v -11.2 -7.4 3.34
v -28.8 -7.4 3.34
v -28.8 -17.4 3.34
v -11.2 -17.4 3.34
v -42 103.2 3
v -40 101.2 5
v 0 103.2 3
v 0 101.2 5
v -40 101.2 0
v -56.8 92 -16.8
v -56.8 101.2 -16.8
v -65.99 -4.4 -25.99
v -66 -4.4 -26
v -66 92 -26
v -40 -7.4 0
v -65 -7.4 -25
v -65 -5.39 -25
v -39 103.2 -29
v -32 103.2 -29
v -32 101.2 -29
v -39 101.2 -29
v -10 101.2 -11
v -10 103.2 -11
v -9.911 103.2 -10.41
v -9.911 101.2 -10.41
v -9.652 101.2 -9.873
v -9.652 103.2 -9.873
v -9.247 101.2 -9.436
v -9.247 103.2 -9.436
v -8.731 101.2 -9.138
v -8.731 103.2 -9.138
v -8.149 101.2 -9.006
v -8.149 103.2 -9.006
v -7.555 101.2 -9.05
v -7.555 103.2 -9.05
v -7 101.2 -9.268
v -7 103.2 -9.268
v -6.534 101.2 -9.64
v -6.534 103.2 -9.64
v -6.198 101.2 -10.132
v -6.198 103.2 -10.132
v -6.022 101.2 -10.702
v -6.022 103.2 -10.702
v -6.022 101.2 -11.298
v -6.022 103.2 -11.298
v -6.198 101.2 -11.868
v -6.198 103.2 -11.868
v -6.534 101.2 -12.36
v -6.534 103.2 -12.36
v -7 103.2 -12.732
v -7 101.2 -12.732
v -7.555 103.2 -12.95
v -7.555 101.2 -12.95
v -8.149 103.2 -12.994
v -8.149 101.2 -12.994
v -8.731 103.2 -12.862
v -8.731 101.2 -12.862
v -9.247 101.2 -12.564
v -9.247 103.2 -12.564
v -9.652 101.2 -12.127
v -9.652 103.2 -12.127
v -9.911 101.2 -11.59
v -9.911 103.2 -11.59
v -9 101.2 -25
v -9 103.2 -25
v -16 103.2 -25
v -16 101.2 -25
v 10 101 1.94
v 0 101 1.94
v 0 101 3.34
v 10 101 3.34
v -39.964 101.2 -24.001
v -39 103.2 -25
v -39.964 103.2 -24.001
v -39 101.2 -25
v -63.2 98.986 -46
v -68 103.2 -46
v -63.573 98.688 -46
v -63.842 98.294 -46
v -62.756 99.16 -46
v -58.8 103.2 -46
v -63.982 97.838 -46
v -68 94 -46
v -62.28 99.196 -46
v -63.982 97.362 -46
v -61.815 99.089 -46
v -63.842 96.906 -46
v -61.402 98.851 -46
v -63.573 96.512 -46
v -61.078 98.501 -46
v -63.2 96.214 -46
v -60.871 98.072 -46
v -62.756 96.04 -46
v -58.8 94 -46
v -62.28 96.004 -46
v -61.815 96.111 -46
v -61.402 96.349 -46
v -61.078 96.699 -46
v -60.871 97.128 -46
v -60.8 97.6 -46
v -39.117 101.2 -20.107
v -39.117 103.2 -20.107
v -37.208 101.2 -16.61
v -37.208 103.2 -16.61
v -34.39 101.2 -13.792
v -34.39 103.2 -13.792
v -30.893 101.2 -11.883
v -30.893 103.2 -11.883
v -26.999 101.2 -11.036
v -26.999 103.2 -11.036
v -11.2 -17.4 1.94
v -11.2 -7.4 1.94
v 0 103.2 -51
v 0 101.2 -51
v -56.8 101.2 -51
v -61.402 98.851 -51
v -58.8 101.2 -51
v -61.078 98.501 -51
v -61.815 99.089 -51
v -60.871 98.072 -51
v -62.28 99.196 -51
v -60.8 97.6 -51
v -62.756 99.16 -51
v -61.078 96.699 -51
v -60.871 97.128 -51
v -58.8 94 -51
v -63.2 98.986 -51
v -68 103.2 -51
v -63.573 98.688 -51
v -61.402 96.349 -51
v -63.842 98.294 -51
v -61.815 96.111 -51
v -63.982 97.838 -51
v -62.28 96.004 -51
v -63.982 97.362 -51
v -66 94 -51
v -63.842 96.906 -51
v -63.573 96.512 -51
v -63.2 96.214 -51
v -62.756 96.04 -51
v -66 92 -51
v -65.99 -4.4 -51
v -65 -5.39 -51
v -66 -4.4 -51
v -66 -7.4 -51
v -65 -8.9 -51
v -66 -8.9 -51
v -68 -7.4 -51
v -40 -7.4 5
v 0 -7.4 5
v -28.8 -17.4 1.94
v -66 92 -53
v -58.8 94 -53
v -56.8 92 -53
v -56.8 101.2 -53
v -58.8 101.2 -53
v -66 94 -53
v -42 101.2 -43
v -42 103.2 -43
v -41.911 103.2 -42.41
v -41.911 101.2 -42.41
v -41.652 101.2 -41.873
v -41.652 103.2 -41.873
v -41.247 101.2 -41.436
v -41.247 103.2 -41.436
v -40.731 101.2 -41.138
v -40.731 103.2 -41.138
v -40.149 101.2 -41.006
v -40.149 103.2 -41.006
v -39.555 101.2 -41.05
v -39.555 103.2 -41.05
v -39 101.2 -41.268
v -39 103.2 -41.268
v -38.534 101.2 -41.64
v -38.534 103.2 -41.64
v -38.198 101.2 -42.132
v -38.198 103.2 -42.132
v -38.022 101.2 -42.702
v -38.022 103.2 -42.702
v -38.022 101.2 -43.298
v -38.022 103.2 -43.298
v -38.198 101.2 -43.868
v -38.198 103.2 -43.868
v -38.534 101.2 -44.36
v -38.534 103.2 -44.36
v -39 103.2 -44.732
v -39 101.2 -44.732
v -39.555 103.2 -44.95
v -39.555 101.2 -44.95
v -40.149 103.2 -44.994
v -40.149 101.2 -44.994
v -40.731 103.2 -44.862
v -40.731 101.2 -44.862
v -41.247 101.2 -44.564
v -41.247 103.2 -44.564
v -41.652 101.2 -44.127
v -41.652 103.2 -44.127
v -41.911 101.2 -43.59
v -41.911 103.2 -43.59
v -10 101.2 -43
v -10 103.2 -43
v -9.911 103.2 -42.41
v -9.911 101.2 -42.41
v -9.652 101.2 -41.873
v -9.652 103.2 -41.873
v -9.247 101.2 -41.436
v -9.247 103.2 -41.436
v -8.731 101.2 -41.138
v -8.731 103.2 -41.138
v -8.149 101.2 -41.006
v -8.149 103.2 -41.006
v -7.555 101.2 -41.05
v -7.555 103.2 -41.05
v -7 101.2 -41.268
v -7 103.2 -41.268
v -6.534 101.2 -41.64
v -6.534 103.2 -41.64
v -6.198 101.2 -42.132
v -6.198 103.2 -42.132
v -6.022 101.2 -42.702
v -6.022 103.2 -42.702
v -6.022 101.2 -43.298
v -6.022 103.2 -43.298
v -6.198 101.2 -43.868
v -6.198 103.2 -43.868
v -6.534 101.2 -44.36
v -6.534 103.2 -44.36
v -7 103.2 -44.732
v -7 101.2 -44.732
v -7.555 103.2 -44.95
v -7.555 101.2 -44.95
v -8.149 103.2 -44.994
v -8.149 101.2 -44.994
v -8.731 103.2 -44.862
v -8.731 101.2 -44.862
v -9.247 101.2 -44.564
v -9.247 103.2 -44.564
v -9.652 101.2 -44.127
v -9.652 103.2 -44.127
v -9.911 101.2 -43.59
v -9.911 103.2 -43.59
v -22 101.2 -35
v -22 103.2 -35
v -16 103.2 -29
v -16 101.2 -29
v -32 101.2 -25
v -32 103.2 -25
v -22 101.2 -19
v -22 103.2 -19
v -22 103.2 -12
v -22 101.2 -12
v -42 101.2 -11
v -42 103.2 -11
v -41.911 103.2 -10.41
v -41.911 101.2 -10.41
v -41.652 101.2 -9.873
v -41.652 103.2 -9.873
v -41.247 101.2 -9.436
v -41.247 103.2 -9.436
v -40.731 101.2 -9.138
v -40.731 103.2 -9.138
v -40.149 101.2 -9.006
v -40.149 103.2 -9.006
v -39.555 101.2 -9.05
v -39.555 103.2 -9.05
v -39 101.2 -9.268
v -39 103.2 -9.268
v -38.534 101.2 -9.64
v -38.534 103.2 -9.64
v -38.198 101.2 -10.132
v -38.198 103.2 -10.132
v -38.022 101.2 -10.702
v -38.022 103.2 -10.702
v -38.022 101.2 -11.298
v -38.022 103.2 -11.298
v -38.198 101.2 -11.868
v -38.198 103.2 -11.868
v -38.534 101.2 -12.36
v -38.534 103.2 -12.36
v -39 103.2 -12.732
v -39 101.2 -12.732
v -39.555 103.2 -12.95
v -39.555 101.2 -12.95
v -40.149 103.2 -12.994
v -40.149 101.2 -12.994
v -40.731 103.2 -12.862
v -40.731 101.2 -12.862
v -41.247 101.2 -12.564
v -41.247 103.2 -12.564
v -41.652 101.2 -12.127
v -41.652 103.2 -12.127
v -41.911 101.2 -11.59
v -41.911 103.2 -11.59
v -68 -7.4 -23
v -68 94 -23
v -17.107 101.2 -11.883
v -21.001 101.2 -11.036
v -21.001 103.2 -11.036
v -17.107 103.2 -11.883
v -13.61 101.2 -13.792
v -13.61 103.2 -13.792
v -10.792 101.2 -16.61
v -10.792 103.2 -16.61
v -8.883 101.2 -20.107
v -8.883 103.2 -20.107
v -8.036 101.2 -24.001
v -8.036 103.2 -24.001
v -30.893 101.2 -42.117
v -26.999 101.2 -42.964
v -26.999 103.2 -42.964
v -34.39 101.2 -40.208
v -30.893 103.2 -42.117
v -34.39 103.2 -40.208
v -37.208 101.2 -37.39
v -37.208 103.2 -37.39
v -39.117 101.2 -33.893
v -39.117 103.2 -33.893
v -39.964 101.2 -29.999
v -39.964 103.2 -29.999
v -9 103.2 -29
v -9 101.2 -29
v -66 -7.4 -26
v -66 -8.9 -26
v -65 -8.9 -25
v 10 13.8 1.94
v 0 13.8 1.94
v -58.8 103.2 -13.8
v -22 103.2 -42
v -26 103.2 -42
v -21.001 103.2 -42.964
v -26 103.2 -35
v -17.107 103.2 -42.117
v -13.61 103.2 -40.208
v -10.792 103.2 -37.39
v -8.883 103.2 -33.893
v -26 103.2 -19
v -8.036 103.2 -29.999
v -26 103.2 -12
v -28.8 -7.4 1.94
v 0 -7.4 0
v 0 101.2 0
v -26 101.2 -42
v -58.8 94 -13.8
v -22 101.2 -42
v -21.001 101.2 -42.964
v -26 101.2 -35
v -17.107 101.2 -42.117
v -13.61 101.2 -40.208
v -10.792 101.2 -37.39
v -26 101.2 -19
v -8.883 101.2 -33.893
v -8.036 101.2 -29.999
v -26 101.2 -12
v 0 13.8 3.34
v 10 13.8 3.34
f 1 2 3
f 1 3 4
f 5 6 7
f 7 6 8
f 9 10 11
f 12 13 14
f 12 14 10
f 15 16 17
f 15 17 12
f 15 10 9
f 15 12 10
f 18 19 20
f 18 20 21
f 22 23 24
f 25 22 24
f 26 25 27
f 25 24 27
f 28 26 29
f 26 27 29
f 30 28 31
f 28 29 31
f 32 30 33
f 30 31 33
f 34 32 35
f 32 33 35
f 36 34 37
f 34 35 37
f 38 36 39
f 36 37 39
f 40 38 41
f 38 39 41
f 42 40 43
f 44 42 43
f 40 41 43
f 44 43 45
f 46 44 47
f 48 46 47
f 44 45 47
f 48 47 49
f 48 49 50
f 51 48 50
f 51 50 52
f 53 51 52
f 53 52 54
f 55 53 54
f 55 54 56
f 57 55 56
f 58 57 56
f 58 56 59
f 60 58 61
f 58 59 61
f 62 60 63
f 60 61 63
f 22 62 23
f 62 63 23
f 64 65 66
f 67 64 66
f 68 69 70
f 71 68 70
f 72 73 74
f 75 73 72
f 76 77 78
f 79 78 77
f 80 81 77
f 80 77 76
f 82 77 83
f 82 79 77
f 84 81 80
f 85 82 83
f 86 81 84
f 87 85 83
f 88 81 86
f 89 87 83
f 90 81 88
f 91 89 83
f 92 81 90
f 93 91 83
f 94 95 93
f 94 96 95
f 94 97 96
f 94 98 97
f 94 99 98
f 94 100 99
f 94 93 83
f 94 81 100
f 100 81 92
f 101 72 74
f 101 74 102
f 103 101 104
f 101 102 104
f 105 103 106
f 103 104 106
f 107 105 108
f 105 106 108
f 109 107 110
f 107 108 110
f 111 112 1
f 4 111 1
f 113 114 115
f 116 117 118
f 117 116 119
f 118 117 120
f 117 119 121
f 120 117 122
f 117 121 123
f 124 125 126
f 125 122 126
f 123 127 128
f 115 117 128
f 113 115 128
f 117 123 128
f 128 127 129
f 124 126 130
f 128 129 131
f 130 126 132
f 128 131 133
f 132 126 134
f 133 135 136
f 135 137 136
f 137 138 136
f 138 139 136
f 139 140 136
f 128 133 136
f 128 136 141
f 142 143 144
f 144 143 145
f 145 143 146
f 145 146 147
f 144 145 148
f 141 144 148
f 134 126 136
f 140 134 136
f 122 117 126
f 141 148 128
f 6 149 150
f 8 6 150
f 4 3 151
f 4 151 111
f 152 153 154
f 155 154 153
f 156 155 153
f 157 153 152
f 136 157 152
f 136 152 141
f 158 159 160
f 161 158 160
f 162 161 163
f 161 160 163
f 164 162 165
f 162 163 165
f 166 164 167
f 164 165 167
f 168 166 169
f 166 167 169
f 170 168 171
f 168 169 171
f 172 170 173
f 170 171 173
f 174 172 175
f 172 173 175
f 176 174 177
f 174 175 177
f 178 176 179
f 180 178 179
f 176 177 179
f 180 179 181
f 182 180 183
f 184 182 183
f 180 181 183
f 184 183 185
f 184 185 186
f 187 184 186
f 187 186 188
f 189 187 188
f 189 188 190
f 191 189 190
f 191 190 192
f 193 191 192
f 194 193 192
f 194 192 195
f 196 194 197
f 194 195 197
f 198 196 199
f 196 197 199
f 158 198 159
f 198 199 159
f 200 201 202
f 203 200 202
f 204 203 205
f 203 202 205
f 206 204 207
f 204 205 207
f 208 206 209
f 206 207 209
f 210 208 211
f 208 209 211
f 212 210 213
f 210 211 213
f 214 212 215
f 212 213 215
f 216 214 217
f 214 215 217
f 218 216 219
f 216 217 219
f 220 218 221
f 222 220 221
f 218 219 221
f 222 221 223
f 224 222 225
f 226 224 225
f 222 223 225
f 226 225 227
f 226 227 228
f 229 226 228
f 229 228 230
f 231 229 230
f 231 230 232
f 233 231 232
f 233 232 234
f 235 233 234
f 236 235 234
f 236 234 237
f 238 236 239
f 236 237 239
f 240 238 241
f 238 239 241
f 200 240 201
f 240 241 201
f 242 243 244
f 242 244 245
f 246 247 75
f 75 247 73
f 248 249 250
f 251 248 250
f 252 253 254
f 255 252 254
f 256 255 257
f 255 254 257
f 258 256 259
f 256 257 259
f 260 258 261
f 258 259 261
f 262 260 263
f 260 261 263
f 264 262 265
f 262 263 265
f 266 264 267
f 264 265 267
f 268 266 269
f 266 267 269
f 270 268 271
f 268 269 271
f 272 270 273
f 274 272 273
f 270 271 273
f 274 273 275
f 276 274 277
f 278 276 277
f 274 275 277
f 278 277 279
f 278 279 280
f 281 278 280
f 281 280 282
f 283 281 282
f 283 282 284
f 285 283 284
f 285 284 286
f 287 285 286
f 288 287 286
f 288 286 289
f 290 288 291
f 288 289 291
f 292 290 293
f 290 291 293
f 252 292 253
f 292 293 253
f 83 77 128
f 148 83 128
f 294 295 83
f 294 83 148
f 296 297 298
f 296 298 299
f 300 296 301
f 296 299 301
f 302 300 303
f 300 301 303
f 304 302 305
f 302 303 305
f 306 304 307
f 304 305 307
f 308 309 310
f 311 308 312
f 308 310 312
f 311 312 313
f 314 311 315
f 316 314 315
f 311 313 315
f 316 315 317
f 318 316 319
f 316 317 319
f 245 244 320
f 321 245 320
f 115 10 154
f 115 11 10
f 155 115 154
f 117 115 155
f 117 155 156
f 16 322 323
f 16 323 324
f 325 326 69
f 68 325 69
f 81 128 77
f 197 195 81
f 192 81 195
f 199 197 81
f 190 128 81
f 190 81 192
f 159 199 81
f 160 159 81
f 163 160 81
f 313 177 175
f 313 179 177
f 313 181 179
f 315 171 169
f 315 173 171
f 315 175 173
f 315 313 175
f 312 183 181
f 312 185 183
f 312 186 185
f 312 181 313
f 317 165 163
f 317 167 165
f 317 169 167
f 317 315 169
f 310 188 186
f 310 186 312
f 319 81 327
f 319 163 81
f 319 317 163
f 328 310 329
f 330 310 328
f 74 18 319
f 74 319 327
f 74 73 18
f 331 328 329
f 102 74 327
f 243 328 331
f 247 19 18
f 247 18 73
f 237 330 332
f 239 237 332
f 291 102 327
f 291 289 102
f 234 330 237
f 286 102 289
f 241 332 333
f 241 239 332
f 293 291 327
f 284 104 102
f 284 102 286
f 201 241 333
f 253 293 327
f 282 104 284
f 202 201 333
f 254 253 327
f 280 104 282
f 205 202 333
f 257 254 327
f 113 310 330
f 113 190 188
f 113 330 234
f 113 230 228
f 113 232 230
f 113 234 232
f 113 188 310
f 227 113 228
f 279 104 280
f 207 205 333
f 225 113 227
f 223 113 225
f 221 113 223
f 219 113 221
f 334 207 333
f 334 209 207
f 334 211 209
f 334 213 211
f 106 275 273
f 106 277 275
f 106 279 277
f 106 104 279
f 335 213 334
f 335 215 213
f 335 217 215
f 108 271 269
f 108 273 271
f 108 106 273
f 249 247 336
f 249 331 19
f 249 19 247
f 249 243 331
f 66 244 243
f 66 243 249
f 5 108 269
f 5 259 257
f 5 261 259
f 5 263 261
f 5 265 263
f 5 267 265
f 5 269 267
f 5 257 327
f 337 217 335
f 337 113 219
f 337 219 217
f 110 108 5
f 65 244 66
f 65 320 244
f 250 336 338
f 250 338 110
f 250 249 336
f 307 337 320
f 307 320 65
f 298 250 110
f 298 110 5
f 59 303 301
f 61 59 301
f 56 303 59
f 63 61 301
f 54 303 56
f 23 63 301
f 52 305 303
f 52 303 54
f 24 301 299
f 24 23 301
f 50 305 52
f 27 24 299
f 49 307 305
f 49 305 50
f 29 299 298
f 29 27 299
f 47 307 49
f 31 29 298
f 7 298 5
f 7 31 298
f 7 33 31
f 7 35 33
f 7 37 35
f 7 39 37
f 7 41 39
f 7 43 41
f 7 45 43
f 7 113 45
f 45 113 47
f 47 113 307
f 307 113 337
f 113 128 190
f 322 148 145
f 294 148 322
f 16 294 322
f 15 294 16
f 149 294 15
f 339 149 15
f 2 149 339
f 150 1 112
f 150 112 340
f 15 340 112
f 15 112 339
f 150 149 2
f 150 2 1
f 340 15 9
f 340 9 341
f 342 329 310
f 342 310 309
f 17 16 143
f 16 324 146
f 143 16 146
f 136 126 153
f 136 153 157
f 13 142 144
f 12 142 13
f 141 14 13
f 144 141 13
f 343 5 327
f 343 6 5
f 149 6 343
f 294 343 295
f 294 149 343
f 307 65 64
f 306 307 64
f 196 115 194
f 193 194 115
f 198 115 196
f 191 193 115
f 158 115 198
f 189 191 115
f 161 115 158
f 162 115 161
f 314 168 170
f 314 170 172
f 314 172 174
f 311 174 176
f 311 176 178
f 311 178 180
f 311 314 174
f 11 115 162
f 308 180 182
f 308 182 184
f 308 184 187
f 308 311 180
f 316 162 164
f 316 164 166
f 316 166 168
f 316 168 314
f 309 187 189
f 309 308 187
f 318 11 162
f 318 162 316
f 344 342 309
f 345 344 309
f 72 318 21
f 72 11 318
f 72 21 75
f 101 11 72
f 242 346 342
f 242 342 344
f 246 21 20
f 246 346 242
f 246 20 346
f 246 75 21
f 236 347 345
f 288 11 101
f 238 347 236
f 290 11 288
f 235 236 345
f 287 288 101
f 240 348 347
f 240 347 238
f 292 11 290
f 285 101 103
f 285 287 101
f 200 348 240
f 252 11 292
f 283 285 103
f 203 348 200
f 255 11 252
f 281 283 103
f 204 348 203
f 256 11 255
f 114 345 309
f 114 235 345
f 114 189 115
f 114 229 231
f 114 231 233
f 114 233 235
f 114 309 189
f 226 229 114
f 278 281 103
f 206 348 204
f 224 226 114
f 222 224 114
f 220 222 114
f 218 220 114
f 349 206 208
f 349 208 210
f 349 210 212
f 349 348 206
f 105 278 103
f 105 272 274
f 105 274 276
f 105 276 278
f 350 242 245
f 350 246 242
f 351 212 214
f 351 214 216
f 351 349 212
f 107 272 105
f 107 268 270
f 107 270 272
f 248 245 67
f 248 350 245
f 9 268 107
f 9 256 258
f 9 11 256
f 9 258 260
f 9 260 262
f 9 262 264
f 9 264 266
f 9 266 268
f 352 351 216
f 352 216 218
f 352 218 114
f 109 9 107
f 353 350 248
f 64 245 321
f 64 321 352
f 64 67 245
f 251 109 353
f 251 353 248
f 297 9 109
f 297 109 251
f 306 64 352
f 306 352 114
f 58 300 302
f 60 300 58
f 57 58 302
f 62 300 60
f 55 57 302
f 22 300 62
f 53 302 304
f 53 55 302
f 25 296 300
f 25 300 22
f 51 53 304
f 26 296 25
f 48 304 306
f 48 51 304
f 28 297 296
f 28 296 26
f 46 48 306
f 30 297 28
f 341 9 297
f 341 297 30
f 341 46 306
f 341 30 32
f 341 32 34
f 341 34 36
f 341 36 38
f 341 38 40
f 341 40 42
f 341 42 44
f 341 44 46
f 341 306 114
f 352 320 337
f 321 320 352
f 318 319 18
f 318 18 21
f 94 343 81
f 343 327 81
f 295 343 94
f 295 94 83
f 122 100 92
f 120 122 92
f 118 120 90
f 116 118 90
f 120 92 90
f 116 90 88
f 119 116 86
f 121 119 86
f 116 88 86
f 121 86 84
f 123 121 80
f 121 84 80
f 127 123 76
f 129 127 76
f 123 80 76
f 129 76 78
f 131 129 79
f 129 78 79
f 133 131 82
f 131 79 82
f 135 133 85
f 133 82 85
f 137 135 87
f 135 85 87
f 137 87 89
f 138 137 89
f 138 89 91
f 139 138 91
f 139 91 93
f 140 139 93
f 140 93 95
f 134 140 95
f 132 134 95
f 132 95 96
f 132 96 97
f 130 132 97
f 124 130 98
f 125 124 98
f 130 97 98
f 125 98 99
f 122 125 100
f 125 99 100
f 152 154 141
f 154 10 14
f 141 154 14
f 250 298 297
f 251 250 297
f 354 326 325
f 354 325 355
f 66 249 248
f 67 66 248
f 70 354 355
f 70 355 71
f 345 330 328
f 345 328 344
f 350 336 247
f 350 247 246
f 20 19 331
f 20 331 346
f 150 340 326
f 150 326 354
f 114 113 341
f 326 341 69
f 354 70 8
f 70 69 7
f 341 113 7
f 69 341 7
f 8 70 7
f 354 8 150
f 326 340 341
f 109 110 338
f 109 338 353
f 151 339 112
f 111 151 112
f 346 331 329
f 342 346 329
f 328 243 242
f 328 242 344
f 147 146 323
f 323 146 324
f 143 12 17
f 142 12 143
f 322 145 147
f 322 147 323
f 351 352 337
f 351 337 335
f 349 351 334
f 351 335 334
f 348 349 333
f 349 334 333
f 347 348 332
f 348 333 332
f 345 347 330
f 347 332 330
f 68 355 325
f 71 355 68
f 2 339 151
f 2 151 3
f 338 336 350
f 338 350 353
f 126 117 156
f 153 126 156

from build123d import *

# Parameters (mm, degrees)
SKETCH_1_W        = 40
SKETCH_1_H        = 93
PAD_DEPTH         = 5
PAD_FACE3_W       = 40
PAD_FACE3_H       = 5
PAD011_DEPTH      = 10.2
SKETCH_W          = 40
SKETCH_H          = 7.4
PAD001_DEPTH      = 5
PAD002_DEPTH      = 110.6
SKETCH005_W       = 9.2
SKETCH005_H       = 9.2
POCKET_DEPTH      = 33.001
SKETCH006_W       = 2
SKETCH006_H       = 101.4
PAD006_DEPTH      = 23
SKETCH011_W       = 87.2
SKETCH011_H       = 1.4
PAD010_DEPTH      = 10
PAD012_DEPTH      = 2
PAD013_DEPTH      = 7.2
PAD014_DEPTH      = 2
SKETCH016_W       = 9.2
SKETCH016_H       = 5
PAD015_DEPTH      = 9.2
SKETCH017_R       = 1.6
POCKET001_DEPTH   = 5
SKETCH018_W       = 17.6
SKETCH018_H       = 1.4
PAD016_DEPTH      = 10
SKETCH019_R       = 2
POCKET002_DEPTH   = 2
CHAMFER_SIZE      = 6
CHAMFER001_SIZE   = 2
PAD017_DEPTH      = 1.5
PAD017_DEPTH_BACK = 3
CHAMFER002_SIZE   = 0.99
CHAMFER003_SIZE   = 1


with BuildPart() as part:
    # Sketch_1 → Pad (new body)
    with BuildSketch(Plane.XY):
        with Locations((-20, 46.5)):
            Rectangle(SKETCH_1_W, SKETCH_1_H)
    extrude(amount=PAD_DEPTH)

    # Pad Face3 → Pad011 (add)
    with BuildSketch(Plane(origin=(-20, 93, 2.5), x_dir=(1, 0, 0), z_dir=(0, 1, 0))):
        Rectangle(PAD_FACE3_W, PAD_FACE3_H)
    extrude(amount=PAD011_DEPTH)

    # Sketch → Pad001 (join)
    with BuildSketch(Plane.XY):
        with Locations((-20, -3.7)):
            Rectangle(SKETCH_W, SKETCH_H)
    extrude(amount=PAD001_DEPTH)

    # Sketch001 (on Face9 of Pad001) → Pad002 (join)
    with BuildSketch(Plane.XZ.offset(7.4)):
        Polygon((-40, 5), (-68, -23), (-68, -28), (-66, -28), (-66, -26), (-40, 0), align=None)
    extrude(amount=-PAD002_DEPTH)

    # Sketch005 (on Face11 of Pad002) → Pocket (cut, through all)
    with BuildSketch(Plane.XY.offset(5)):
        with Locations((-63.4, 98.6)):
            Rectangle(SKETCH005_W, SKETCH005_H)
    extrude(amount=-POCKET_DEPTH, mode=Mode.SUBTRACT)

    # Sketch006 → Pad006 (join)
    with BuildSketch(Plane(origin=(0, 0, -28), x_dir=(1, 0, 0), z_dir=(0, 0, -1))):
        with Locations((-67, -43.3)):
            Rectangle(SKETCH006_W, SKETCH006_H)
    extrude(amount=PAD006_DEPTH)

    # Sketch011 → Pad010 (join)
    with BuildSketch(Plane.YZ):
        with Locations((57.4, 2.64)):
            Rectangle(SKETCH011_W, SKETCH011_H)
    extrude(amount=PAD010_DEPTH)

    # Sketch013 (on Face8 of Pad006) → Pad012 (join)
    with BuildSketch(Plane(origin=(0, 103.2, 0), x_dir=(-1, 0, 0), z_dir=(0, 1, 0))):
        Polygon((0, 0), (40, 0), (58.8, -18.8), (58.8, -51), (0, -51), align=None)
    extrude(amount=-PAD012_DEPTH)

    # Sketch014 (on Face24 of Pad012) → Pad013 (join)
    with BuildSketch(Plane.XZ.offset(-101.2)):
        Polygon((-58.8, -51), (-58.8, -18.8), (-56.8, -16.8), (-56.8, -51), (-56.8, -53), (-58.8, -53), align=None)
    extrude(amount=PAD013_DEPTH)

    # Sketch015 (on Face23 of Pad013) → Pad014 (join)
    with BuildSketch(Plane.XZ.offset(-94)):
        Polygon((-56.8, -53), (-66, -53), (-66, -26), (-56.8, -16.8), align=None)
    extrude(amount=PAD014_DEPTH)

    # Sketch016 (on Face41 of Pad014) → Pad015 (join)
    with BuildSketch(Plane(origin=(-58.8, 0, 0), x_dir=(0, -1, 0), z_dir=(-1, 0, 0))):
        with Locations((-98.6, -48.5)):
            Rectangle(SKETCH016_W, SKETCH016_H)
    extrude(amount=PAD015_DEPTH)

    # Sketch017 (on Face49 of Pad015) → Pocket001 (cut)
    with BuildSketch(Plane.XY.offset(-46)):
        with Locations((-62.4, 97.6)):
            Circle(SKETCH017_R)
    extrude(amount=-POCKET001_DEPTH, mode=Mode.SUBTRACT)

    # Sketch018 (on Face12 of Pocket001) → Pad016 (join)
    with BuildSketch(Plane.XZ.offset(7.4)):
        with Locations((-20, 2.64)):
            Rectangle(SKETCH018_W, SKETCH018_H)
    extrude(amount=PAD016_DEPTH)

    # Sketch019 (on Face34 of Pad016) → Pocket002 (cut)
    with BuildSketch(Plane(origin=(0, 103.2, 0), x_dir=(-1, 0, 0), z_dir=(0, 1, 0))):
        with Locations((8, -11)):
            Circle(SKETCH019_R)
        with Locations((8, -43)):
            Circle(SKETCH019_R)
        with Locations((40, -43)):
            Circle(SKETCH019_R)
        with Locations((40, -11)):
            Circle(SKETCH019_R)
        with BuildLine():
            Line((8, -25), (22, -25))
            Line((22, -25), (22, -11))
            ThreePointArc((22, -11), (12.100505, -15.100505), (8, -25))
        make_face()
        with BuildLine():
            Line((26, -25), (26, -11))
            ThreePointArc((40, -25), (35.899495, -15.100505), (26, -11))
            Line((26, -25), (40, -25))
        make_face()
        with BuildLine():
            Line((22, -29), (8, -29))
            ThreePointArc((8, -29), (12.100505, -38.899495), (22, -43))
            Line((22, -29), (22, -43))
        make_face()
        with BuildLine():
            Line((26, -29), (40, -29))
            ThreePointArc((26, -43), (35.899495, -38.899495), (40, -29))
            Line((26, -29), (26, -43))
        make_face()
    extrude(amount=-POCKET002_DEPTH, mode=Mode.SUBTRACT)

    # Chamfer
    chamfer_edges = [part.edges().sort_by_distance(p)[0] for p in [
        (-22, 102.2, -25),
        (-26, 102.2, -25),
        (-22, 102.2, -29),
        (-26, 102.2, -29),
    ]]
    chamfer(chamfer_edges, length=CHAMFER_SIZE)

    # Chamfer001
    chamfer001_edges = [part.edges().sort_by_distance(p)[0] for p in [
        (-20, 103.2, 5),
    ]]
    chamfer(chamfer001_edges, length=CHAMFER001_SIZE)

    # Sketch020 (on Face62 of Chamfer001) → Pad017 (join, two sides)
    with BuildSketch(Plane.XZ.offset(7.4)) as pad017_sk:
        Polygon((-66, -51), (-66, -26), (-65, -25), (-65, -51), align=None)
    extrude(amount=PAD017_DEPTH)
    extrude(pad017_sk.sketch, amount=-PAD017_DEPTH_BACK)

    # Chamfer002
    chamfer002_edges = [part.edges().sort_by_distance(p)[0] for p in [
        (-65, -4.4, -38),
    ]]
    chamfer(chamfer002_edges, length=CHAMFER002_SIZE)

    # Chamfer003
    chamfer003_edges = [part.edges().sort_by_distance(p)[0] for p in [
        (-8, 102.2, -25),
        (-8, 102.2, -29),
        (-22, 102.2, -11),
        (-26, 102.2, -11),
        (-40, 102.2, -25),
        (-40, 102.2, -29),
        (-26, 102.2, -43),
        (-22, 102.2, -43),
    ]]
    chamfer(chamfer003_edges, length=CHAMFER003_SIZE)


solid = part.part
